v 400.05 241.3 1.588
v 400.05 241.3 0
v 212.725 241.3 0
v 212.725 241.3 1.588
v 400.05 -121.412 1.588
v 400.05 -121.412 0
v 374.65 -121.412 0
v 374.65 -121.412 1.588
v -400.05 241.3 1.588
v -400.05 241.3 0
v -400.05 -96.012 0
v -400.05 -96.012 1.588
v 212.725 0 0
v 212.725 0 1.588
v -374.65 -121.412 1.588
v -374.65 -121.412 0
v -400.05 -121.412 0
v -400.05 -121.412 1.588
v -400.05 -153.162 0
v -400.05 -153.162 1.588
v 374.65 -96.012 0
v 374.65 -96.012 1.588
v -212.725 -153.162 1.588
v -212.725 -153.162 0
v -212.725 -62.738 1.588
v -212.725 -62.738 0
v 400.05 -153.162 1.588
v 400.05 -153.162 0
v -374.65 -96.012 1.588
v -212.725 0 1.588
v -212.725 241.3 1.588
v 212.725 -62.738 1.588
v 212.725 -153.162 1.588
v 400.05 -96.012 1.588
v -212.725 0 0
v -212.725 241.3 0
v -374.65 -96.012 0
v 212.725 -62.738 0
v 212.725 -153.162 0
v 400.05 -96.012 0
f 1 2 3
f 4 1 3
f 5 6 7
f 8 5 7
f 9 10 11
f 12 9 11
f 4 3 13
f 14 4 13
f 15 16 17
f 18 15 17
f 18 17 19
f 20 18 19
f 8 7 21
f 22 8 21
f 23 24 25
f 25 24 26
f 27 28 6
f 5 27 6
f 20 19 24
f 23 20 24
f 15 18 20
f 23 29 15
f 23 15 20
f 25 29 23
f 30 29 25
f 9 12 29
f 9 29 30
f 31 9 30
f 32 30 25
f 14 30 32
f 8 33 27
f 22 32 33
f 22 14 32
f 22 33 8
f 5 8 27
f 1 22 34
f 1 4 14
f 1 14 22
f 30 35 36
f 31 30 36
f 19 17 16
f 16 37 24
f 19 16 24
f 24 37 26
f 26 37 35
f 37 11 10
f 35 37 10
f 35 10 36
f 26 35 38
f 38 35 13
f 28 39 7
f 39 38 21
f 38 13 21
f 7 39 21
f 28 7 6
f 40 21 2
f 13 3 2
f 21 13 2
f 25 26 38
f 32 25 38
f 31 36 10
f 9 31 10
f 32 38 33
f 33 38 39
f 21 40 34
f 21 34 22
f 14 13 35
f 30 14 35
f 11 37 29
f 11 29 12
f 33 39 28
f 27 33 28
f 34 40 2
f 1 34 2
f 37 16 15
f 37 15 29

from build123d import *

# Parameters (mm, degrees)
BOSS_EXTRUDE1_DEPTH = 1.5875
SKETCH2_W           = 25.4
SKETCH2_H           = 25.4
CUT_EXTRUDE1_DEPTH  = 2.5875
SKETCH3_W           = 25.4
SKETCH3_H           = 25.4
CUT_EXTRUDE2_DEPTH  = 2.5875


with BuildPart() as part:
    # Sketch1 → Boss-Extrude1 (new body)
    with BuildSketch(Plane.XY):
        Polygon((-400.05, 241.3), (-400.05, -153.162), (-212.725, -153.162), (-212.725, -62.738), (212.725, -62.738), (212.725, -153.162), (400.05, -153.162), (400.05, 241.3), (212.725, 241.3), (212.725, 0), (-212.725, 0), (-212.725, 241.3), align=None)
    extrude(amount=BOSS_EXTRUDE1_DEPTH)

    # Sketch2 → Cut-Extrude1 (cut, through all)
    with BuildSketch(Plane(origin=(0, 0, 0), x_dir=(-1, 0, 0), z_dir=(0, 0, -1))):
        with Locations((-387.35, -108.712)):
            Rectangle(SKETCH2_W, SKETCH2_H)
    extrude(amount=-CUT_EXTRUDE1_DEPTH, mode=Mode.SUBTRACT)

    # Sketch3 → Cut-Extrude2 (cut, through all)
    with BuildSketch(Plane(origin=(0, 0, 0), x_dir=(-1, 0, 0), z_dir=(0, 0, -1))):
        with Locations((387.35, -108.712)):
            Rectangle(SKETCH3_W, SKETCH3_H)
    extrude(amount=-CUT_EXTRUDE2_DEPTH, mode=Mode.SUBTRACT)


solid = part.part
